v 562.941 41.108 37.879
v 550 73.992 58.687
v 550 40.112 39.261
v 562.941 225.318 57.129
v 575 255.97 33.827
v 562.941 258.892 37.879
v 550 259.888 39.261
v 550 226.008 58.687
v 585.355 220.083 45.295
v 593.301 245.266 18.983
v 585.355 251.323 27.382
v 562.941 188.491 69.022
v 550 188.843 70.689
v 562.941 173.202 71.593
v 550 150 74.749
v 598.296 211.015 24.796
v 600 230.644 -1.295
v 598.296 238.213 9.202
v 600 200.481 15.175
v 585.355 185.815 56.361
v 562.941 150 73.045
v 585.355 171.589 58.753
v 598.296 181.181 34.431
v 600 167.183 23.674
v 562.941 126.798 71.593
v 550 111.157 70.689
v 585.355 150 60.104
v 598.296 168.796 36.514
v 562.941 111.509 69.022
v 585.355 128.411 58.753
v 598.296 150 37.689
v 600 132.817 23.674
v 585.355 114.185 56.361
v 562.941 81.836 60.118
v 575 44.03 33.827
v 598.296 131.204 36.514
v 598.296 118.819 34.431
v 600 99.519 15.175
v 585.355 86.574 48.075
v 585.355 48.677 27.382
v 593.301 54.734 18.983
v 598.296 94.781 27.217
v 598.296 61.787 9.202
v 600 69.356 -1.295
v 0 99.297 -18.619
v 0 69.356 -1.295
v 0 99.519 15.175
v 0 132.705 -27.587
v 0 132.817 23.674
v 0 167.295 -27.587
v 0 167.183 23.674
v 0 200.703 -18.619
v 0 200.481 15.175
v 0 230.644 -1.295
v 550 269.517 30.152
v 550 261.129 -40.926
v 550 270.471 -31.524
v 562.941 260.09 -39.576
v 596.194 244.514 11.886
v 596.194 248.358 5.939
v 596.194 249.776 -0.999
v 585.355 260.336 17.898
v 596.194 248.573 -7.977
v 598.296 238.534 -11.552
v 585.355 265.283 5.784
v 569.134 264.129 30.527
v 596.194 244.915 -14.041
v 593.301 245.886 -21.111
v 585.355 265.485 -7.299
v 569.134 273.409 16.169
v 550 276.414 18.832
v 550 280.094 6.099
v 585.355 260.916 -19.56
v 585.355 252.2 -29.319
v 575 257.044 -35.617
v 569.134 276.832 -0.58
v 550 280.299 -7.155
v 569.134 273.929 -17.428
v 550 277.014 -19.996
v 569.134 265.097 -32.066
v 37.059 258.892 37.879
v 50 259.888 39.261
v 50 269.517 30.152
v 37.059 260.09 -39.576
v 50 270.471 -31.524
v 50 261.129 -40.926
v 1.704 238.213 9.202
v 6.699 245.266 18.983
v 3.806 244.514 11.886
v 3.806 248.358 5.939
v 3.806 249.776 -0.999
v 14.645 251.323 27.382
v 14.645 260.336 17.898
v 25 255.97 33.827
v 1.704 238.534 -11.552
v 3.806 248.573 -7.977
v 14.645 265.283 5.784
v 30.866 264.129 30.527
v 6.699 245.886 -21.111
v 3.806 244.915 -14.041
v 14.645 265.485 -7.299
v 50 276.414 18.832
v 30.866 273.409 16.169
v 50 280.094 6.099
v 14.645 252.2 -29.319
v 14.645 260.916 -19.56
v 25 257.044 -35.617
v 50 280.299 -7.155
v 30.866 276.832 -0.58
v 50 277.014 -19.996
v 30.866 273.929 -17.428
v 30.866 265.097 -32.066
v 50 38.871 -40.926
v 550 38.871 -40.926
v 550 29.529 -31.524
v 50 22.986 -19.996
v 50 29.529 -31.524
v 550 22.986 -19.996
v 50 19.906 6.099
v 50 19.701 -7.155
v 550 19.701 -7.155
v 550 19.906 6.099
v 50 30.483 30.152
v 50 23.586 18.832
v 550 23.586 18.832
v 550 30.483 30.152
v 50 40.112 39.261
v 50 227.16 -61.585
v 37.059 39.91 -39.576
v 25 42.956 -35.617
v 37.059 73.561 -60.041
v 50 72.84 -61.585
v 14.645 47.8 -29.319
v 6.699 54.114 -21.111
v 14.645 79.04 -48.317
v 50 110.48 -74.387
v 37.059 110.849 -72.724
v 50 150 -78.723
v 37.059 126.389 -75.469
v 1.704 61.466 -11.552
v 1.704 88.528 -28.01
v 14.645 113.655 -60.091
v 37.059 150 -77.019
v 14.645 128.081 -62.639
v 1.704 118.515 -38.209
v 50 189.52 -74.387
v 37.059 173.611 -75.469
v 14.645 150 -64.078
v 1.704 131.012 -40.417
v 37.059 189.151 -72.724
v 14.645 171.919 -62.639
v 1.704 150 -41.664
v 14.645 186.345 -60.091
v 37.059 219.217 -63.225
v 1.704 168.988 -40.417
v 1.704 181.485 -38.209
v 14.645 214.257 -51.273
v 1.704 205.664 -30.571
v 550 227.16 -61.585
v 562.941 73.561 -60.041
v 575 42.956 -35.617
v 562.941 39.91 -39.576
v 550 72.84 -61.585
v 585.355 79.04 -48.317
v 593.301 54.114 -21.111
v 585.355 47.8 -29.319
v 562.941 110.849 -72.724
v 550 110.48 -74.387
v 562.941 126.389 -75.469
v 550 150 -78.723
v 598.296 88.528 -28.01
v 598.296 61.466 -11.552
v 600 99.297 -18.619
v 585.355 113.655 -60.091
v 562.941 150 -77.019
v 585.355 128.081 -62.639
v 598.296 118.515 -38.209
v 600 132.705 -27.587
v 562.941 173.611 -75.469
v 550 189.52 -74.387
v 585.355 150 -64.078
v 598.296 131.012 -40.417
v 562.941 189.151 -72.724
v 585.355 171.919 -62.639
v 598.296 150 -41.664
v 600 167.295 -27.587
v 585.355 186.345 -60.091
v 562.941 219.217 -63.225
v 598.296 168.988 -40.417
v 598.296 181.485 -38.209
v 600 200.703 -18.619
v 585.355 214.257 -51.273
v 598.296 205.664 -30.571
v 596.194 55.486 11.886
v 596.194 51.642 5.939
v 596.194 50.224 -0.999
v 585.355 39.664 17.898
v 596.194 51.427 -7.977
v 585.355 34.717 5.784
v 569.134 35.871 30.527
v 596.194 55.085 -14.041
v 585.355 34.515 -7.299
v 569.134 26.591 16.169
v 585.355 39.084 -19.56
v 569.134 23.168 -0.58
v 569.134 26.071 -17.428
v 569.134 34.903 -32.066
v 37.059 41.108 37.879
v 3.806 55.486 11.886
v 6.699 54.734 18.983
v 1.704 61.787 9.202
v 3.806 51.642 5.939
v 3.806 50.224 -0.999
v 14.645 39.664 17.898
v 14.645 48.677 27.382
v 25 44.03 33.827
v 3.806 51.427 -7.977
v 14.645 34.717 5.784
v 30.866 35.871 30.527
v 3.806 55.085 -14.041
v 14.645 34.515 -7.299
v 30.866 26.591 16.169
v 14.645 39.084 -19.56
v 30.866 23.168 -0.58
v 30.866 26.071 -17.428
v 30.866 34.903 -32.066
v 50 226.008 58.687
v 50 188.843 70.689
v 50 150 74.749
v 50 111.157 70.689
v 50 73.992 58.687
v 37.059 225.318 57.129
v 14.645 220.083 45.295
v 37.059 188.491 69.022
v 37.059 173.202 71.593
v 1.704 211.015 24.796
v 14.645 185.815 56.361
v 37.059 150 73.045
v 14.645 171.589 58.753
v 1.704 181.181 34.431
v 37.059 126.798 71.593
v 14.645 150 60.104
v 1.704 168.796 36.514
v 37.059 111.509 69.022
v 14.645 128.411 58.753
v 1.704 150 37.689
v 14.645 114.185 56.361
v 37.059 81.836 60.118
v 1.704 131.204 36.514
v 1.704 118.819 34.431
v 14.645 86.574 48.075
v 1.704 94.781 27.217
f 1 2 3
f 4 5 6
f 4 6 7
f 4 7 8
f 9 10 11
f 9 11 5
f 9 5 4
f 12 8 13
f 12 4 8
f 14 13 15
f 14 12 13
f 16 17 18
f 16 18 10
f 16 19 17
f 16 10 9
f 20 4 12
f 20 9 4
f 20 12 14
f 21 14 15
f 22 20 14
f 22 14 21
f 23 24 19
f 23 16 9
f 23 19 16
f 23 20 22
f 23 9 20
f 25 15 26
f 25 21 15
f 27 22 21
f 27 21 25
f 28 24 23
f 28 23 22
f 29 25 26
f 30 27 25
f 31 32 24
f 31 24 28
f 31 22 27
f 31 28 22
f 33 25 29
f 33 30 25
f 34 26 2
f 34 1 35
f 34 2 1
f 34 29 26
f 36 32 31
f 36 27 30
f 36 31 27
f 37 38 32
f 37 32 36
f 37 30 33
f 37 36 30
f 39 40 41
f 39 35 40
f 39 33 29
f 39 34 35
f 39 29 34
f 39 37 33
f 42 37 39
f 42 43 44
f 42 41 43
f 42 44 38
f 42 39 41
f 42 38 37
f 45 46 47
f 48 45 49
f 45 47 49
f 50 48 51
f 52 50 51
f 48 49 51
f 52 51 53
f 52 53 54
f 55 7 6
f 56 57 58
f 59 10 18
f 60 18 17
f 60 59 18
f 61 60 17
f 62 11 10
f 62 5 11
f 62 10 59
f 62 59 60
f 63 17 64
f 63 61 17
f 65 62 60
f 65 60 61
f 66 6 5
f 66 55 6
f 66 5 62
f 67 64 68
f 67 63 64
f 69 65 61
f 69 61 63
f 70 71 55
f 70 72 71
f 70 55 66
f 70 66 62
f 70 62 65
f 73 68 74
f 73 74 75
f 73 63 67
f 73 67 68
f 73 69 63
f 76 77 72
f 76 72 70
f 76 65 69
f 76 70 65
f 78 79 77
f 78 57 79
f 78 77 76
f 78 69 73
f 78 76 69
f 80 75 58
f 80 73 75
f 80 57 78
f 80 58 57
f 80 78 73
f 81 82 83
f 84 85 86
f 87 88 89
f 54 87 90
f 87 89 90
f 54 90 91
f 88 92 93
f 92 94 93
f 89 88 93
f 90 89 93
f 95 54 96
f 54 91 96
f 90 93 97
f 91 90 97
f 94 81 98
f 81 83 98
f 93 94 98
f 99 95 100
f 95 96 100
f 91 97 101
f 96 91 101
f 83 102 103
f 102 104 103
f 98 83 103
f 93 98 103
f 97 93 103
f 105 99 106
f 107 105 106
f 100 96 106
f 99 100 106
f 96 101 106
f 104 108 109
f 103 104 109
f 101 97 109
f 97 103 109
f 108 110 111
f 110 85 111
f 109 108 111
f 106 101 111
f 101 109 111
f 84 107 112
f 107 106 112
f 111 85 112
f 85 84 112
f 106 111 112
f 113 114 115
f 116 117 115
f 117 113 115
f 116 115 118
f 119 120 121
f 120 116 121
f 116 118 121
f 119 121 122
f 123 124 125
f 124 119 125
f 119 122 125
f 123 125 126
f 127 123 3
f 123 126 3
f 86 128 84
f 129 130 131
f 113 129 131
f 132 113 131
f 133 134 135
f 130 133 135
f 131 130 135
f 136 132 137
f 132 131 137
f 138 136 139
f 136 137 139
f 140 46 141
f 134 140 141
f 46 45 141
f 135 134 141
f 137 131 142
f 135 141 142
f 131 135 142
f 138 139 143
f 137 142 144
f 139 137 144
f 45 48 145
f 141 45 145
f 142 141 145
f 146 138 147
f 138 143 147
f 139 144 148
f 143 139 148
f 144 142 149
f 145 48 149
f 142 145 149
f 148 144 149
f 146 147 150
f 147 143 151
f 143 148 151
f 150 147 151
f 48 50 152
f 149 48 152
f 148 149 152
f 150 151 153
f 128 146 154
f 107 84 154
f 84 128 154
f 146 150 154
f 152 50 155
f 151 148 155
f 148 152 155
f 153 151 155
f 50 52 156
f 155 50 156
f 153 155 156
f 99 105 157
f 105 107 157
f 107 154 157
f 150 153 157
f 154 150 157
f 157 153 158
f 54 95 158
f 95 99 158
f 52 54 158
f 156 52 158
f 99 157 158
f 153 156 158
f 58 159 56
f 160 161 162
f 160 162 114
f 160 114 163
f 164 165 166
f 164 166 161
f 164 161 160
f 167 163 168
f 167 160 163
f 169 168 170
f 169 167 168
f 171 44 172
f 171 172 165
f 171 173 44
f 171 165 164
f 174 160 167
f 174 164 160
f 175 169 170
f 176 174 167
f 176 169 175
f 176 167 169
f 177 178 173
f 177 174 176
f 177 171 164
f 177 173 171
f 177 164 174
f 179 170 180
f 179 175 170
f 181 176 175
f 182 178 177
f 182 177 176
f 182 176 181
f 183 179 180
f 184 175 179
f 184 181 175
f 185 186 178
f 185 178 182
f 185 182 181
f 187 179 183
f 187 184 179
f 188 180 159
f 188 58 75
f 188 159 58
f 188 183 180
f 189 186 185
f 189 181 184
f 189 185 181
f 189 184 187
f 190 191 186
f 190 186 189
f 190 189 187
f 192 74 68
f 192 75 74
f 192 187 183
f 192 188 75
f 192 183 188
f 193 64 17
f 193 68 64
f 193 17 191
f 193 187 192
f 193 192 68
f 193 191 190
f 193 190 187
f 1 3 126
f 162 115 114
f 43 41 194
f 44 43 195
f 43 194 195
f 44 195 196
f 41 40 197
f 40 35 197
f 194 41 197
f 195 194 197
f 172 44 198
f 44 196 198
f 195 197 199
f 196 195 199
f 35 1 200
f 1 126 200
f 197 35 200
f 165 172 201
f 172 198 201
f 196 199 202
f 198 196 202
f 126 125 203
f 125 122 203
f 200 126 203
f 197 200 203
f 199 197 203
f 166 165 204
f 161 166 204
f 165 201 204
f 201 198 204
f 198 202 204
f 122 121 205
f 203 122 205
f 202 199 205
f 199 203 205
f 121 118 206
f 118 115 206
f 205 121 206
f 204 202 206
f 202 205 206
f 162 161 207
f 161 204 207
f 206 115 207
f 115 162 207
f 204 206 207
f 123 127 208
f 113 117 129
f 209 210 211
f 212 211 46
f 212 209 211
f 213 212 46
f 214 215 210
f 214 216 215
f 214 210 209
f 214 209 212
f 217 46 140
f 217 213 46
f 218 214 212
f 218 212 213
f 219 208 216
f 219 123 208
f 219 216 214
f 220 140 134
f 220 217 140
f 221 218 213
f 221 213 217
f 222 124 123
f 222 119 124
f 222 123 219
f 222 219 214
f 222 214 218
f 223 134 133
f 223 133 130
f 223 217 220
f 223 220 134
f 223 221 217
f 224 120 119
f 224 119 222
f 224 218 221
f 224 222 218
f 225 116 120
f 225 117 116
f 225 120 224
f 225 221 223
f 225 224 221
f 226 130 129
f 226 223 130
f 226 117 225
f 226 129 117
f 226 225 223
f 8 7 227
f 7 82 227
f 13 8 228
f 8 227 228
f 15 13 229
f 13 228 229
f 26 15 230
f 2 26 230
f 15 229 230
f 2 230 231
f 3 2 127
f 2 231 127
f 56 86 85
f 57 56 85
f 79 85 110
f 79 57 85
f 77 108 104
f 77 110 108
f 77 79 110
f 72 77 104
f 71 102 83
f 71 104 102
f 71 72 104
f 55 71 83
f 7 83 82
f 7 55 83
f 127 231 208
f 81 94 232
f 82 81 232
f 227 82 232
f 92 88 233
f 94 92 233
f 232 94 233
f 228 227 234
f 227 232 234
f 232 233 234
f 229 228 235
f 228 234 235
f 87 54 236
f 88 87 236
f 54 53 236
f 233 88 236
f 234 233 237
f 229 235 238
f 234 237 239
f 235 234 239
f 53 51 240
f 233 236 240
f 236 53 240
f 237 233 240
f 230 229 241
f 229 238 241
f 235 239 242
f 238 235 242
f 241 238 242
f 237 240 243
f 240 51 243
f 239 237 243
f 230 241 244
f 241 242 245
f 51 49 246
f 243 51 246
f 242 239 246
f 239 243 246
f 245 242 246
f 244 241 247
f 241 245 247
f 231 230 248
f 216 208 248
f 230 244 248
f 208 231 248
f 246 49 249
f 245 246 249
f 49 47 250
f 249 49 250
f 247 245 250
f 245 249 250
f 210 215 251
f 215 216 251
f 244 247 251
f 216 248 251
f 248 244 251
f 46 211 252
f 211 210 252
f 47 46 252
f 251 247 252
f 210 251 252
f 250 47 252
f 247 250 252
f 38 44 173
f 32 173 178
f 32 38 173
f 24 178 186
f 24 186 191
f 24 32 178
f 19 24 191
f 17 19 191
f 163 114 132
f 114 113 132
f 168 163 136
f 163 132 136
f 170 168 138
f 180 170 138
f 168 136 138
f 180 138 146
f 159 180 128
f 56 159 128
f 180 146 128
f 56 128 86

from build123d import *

# Parameters (mm, degrees)
F1_DEPTH = 600
F3_R     = 50


# Not quite as in the source:
# - a feature of the source that left no trace in its solid (it failed there, or was rolled back) is left out


with BuildPart() as f1:
    # F0 (on Right) → F1 (new body)
    with BuildSketch(Plane.YZ):
        with BuildLine():
            ThreePointArc((0, 0), (150, -78.7228552032), (300, 0))
            ThreePointArc((300, 0), (150, 74.7485079271), (0, 0))
        make_face()
    extrude(amount=F1_DEPTH)

    # F3
    f3_edges = [f1.edges().sort_by_distance(p)[0] for p in [
        (600, 150, 74.748508),
        (600, 150, -78.722855),
        (0, 150, 74.748508),
        (0, 150, -78.722855),
        (300, 300, 0),
        (300, 0, 0),
    ]]
    fillet(f3_edges, radius=F3_R)


solid = f1.part
